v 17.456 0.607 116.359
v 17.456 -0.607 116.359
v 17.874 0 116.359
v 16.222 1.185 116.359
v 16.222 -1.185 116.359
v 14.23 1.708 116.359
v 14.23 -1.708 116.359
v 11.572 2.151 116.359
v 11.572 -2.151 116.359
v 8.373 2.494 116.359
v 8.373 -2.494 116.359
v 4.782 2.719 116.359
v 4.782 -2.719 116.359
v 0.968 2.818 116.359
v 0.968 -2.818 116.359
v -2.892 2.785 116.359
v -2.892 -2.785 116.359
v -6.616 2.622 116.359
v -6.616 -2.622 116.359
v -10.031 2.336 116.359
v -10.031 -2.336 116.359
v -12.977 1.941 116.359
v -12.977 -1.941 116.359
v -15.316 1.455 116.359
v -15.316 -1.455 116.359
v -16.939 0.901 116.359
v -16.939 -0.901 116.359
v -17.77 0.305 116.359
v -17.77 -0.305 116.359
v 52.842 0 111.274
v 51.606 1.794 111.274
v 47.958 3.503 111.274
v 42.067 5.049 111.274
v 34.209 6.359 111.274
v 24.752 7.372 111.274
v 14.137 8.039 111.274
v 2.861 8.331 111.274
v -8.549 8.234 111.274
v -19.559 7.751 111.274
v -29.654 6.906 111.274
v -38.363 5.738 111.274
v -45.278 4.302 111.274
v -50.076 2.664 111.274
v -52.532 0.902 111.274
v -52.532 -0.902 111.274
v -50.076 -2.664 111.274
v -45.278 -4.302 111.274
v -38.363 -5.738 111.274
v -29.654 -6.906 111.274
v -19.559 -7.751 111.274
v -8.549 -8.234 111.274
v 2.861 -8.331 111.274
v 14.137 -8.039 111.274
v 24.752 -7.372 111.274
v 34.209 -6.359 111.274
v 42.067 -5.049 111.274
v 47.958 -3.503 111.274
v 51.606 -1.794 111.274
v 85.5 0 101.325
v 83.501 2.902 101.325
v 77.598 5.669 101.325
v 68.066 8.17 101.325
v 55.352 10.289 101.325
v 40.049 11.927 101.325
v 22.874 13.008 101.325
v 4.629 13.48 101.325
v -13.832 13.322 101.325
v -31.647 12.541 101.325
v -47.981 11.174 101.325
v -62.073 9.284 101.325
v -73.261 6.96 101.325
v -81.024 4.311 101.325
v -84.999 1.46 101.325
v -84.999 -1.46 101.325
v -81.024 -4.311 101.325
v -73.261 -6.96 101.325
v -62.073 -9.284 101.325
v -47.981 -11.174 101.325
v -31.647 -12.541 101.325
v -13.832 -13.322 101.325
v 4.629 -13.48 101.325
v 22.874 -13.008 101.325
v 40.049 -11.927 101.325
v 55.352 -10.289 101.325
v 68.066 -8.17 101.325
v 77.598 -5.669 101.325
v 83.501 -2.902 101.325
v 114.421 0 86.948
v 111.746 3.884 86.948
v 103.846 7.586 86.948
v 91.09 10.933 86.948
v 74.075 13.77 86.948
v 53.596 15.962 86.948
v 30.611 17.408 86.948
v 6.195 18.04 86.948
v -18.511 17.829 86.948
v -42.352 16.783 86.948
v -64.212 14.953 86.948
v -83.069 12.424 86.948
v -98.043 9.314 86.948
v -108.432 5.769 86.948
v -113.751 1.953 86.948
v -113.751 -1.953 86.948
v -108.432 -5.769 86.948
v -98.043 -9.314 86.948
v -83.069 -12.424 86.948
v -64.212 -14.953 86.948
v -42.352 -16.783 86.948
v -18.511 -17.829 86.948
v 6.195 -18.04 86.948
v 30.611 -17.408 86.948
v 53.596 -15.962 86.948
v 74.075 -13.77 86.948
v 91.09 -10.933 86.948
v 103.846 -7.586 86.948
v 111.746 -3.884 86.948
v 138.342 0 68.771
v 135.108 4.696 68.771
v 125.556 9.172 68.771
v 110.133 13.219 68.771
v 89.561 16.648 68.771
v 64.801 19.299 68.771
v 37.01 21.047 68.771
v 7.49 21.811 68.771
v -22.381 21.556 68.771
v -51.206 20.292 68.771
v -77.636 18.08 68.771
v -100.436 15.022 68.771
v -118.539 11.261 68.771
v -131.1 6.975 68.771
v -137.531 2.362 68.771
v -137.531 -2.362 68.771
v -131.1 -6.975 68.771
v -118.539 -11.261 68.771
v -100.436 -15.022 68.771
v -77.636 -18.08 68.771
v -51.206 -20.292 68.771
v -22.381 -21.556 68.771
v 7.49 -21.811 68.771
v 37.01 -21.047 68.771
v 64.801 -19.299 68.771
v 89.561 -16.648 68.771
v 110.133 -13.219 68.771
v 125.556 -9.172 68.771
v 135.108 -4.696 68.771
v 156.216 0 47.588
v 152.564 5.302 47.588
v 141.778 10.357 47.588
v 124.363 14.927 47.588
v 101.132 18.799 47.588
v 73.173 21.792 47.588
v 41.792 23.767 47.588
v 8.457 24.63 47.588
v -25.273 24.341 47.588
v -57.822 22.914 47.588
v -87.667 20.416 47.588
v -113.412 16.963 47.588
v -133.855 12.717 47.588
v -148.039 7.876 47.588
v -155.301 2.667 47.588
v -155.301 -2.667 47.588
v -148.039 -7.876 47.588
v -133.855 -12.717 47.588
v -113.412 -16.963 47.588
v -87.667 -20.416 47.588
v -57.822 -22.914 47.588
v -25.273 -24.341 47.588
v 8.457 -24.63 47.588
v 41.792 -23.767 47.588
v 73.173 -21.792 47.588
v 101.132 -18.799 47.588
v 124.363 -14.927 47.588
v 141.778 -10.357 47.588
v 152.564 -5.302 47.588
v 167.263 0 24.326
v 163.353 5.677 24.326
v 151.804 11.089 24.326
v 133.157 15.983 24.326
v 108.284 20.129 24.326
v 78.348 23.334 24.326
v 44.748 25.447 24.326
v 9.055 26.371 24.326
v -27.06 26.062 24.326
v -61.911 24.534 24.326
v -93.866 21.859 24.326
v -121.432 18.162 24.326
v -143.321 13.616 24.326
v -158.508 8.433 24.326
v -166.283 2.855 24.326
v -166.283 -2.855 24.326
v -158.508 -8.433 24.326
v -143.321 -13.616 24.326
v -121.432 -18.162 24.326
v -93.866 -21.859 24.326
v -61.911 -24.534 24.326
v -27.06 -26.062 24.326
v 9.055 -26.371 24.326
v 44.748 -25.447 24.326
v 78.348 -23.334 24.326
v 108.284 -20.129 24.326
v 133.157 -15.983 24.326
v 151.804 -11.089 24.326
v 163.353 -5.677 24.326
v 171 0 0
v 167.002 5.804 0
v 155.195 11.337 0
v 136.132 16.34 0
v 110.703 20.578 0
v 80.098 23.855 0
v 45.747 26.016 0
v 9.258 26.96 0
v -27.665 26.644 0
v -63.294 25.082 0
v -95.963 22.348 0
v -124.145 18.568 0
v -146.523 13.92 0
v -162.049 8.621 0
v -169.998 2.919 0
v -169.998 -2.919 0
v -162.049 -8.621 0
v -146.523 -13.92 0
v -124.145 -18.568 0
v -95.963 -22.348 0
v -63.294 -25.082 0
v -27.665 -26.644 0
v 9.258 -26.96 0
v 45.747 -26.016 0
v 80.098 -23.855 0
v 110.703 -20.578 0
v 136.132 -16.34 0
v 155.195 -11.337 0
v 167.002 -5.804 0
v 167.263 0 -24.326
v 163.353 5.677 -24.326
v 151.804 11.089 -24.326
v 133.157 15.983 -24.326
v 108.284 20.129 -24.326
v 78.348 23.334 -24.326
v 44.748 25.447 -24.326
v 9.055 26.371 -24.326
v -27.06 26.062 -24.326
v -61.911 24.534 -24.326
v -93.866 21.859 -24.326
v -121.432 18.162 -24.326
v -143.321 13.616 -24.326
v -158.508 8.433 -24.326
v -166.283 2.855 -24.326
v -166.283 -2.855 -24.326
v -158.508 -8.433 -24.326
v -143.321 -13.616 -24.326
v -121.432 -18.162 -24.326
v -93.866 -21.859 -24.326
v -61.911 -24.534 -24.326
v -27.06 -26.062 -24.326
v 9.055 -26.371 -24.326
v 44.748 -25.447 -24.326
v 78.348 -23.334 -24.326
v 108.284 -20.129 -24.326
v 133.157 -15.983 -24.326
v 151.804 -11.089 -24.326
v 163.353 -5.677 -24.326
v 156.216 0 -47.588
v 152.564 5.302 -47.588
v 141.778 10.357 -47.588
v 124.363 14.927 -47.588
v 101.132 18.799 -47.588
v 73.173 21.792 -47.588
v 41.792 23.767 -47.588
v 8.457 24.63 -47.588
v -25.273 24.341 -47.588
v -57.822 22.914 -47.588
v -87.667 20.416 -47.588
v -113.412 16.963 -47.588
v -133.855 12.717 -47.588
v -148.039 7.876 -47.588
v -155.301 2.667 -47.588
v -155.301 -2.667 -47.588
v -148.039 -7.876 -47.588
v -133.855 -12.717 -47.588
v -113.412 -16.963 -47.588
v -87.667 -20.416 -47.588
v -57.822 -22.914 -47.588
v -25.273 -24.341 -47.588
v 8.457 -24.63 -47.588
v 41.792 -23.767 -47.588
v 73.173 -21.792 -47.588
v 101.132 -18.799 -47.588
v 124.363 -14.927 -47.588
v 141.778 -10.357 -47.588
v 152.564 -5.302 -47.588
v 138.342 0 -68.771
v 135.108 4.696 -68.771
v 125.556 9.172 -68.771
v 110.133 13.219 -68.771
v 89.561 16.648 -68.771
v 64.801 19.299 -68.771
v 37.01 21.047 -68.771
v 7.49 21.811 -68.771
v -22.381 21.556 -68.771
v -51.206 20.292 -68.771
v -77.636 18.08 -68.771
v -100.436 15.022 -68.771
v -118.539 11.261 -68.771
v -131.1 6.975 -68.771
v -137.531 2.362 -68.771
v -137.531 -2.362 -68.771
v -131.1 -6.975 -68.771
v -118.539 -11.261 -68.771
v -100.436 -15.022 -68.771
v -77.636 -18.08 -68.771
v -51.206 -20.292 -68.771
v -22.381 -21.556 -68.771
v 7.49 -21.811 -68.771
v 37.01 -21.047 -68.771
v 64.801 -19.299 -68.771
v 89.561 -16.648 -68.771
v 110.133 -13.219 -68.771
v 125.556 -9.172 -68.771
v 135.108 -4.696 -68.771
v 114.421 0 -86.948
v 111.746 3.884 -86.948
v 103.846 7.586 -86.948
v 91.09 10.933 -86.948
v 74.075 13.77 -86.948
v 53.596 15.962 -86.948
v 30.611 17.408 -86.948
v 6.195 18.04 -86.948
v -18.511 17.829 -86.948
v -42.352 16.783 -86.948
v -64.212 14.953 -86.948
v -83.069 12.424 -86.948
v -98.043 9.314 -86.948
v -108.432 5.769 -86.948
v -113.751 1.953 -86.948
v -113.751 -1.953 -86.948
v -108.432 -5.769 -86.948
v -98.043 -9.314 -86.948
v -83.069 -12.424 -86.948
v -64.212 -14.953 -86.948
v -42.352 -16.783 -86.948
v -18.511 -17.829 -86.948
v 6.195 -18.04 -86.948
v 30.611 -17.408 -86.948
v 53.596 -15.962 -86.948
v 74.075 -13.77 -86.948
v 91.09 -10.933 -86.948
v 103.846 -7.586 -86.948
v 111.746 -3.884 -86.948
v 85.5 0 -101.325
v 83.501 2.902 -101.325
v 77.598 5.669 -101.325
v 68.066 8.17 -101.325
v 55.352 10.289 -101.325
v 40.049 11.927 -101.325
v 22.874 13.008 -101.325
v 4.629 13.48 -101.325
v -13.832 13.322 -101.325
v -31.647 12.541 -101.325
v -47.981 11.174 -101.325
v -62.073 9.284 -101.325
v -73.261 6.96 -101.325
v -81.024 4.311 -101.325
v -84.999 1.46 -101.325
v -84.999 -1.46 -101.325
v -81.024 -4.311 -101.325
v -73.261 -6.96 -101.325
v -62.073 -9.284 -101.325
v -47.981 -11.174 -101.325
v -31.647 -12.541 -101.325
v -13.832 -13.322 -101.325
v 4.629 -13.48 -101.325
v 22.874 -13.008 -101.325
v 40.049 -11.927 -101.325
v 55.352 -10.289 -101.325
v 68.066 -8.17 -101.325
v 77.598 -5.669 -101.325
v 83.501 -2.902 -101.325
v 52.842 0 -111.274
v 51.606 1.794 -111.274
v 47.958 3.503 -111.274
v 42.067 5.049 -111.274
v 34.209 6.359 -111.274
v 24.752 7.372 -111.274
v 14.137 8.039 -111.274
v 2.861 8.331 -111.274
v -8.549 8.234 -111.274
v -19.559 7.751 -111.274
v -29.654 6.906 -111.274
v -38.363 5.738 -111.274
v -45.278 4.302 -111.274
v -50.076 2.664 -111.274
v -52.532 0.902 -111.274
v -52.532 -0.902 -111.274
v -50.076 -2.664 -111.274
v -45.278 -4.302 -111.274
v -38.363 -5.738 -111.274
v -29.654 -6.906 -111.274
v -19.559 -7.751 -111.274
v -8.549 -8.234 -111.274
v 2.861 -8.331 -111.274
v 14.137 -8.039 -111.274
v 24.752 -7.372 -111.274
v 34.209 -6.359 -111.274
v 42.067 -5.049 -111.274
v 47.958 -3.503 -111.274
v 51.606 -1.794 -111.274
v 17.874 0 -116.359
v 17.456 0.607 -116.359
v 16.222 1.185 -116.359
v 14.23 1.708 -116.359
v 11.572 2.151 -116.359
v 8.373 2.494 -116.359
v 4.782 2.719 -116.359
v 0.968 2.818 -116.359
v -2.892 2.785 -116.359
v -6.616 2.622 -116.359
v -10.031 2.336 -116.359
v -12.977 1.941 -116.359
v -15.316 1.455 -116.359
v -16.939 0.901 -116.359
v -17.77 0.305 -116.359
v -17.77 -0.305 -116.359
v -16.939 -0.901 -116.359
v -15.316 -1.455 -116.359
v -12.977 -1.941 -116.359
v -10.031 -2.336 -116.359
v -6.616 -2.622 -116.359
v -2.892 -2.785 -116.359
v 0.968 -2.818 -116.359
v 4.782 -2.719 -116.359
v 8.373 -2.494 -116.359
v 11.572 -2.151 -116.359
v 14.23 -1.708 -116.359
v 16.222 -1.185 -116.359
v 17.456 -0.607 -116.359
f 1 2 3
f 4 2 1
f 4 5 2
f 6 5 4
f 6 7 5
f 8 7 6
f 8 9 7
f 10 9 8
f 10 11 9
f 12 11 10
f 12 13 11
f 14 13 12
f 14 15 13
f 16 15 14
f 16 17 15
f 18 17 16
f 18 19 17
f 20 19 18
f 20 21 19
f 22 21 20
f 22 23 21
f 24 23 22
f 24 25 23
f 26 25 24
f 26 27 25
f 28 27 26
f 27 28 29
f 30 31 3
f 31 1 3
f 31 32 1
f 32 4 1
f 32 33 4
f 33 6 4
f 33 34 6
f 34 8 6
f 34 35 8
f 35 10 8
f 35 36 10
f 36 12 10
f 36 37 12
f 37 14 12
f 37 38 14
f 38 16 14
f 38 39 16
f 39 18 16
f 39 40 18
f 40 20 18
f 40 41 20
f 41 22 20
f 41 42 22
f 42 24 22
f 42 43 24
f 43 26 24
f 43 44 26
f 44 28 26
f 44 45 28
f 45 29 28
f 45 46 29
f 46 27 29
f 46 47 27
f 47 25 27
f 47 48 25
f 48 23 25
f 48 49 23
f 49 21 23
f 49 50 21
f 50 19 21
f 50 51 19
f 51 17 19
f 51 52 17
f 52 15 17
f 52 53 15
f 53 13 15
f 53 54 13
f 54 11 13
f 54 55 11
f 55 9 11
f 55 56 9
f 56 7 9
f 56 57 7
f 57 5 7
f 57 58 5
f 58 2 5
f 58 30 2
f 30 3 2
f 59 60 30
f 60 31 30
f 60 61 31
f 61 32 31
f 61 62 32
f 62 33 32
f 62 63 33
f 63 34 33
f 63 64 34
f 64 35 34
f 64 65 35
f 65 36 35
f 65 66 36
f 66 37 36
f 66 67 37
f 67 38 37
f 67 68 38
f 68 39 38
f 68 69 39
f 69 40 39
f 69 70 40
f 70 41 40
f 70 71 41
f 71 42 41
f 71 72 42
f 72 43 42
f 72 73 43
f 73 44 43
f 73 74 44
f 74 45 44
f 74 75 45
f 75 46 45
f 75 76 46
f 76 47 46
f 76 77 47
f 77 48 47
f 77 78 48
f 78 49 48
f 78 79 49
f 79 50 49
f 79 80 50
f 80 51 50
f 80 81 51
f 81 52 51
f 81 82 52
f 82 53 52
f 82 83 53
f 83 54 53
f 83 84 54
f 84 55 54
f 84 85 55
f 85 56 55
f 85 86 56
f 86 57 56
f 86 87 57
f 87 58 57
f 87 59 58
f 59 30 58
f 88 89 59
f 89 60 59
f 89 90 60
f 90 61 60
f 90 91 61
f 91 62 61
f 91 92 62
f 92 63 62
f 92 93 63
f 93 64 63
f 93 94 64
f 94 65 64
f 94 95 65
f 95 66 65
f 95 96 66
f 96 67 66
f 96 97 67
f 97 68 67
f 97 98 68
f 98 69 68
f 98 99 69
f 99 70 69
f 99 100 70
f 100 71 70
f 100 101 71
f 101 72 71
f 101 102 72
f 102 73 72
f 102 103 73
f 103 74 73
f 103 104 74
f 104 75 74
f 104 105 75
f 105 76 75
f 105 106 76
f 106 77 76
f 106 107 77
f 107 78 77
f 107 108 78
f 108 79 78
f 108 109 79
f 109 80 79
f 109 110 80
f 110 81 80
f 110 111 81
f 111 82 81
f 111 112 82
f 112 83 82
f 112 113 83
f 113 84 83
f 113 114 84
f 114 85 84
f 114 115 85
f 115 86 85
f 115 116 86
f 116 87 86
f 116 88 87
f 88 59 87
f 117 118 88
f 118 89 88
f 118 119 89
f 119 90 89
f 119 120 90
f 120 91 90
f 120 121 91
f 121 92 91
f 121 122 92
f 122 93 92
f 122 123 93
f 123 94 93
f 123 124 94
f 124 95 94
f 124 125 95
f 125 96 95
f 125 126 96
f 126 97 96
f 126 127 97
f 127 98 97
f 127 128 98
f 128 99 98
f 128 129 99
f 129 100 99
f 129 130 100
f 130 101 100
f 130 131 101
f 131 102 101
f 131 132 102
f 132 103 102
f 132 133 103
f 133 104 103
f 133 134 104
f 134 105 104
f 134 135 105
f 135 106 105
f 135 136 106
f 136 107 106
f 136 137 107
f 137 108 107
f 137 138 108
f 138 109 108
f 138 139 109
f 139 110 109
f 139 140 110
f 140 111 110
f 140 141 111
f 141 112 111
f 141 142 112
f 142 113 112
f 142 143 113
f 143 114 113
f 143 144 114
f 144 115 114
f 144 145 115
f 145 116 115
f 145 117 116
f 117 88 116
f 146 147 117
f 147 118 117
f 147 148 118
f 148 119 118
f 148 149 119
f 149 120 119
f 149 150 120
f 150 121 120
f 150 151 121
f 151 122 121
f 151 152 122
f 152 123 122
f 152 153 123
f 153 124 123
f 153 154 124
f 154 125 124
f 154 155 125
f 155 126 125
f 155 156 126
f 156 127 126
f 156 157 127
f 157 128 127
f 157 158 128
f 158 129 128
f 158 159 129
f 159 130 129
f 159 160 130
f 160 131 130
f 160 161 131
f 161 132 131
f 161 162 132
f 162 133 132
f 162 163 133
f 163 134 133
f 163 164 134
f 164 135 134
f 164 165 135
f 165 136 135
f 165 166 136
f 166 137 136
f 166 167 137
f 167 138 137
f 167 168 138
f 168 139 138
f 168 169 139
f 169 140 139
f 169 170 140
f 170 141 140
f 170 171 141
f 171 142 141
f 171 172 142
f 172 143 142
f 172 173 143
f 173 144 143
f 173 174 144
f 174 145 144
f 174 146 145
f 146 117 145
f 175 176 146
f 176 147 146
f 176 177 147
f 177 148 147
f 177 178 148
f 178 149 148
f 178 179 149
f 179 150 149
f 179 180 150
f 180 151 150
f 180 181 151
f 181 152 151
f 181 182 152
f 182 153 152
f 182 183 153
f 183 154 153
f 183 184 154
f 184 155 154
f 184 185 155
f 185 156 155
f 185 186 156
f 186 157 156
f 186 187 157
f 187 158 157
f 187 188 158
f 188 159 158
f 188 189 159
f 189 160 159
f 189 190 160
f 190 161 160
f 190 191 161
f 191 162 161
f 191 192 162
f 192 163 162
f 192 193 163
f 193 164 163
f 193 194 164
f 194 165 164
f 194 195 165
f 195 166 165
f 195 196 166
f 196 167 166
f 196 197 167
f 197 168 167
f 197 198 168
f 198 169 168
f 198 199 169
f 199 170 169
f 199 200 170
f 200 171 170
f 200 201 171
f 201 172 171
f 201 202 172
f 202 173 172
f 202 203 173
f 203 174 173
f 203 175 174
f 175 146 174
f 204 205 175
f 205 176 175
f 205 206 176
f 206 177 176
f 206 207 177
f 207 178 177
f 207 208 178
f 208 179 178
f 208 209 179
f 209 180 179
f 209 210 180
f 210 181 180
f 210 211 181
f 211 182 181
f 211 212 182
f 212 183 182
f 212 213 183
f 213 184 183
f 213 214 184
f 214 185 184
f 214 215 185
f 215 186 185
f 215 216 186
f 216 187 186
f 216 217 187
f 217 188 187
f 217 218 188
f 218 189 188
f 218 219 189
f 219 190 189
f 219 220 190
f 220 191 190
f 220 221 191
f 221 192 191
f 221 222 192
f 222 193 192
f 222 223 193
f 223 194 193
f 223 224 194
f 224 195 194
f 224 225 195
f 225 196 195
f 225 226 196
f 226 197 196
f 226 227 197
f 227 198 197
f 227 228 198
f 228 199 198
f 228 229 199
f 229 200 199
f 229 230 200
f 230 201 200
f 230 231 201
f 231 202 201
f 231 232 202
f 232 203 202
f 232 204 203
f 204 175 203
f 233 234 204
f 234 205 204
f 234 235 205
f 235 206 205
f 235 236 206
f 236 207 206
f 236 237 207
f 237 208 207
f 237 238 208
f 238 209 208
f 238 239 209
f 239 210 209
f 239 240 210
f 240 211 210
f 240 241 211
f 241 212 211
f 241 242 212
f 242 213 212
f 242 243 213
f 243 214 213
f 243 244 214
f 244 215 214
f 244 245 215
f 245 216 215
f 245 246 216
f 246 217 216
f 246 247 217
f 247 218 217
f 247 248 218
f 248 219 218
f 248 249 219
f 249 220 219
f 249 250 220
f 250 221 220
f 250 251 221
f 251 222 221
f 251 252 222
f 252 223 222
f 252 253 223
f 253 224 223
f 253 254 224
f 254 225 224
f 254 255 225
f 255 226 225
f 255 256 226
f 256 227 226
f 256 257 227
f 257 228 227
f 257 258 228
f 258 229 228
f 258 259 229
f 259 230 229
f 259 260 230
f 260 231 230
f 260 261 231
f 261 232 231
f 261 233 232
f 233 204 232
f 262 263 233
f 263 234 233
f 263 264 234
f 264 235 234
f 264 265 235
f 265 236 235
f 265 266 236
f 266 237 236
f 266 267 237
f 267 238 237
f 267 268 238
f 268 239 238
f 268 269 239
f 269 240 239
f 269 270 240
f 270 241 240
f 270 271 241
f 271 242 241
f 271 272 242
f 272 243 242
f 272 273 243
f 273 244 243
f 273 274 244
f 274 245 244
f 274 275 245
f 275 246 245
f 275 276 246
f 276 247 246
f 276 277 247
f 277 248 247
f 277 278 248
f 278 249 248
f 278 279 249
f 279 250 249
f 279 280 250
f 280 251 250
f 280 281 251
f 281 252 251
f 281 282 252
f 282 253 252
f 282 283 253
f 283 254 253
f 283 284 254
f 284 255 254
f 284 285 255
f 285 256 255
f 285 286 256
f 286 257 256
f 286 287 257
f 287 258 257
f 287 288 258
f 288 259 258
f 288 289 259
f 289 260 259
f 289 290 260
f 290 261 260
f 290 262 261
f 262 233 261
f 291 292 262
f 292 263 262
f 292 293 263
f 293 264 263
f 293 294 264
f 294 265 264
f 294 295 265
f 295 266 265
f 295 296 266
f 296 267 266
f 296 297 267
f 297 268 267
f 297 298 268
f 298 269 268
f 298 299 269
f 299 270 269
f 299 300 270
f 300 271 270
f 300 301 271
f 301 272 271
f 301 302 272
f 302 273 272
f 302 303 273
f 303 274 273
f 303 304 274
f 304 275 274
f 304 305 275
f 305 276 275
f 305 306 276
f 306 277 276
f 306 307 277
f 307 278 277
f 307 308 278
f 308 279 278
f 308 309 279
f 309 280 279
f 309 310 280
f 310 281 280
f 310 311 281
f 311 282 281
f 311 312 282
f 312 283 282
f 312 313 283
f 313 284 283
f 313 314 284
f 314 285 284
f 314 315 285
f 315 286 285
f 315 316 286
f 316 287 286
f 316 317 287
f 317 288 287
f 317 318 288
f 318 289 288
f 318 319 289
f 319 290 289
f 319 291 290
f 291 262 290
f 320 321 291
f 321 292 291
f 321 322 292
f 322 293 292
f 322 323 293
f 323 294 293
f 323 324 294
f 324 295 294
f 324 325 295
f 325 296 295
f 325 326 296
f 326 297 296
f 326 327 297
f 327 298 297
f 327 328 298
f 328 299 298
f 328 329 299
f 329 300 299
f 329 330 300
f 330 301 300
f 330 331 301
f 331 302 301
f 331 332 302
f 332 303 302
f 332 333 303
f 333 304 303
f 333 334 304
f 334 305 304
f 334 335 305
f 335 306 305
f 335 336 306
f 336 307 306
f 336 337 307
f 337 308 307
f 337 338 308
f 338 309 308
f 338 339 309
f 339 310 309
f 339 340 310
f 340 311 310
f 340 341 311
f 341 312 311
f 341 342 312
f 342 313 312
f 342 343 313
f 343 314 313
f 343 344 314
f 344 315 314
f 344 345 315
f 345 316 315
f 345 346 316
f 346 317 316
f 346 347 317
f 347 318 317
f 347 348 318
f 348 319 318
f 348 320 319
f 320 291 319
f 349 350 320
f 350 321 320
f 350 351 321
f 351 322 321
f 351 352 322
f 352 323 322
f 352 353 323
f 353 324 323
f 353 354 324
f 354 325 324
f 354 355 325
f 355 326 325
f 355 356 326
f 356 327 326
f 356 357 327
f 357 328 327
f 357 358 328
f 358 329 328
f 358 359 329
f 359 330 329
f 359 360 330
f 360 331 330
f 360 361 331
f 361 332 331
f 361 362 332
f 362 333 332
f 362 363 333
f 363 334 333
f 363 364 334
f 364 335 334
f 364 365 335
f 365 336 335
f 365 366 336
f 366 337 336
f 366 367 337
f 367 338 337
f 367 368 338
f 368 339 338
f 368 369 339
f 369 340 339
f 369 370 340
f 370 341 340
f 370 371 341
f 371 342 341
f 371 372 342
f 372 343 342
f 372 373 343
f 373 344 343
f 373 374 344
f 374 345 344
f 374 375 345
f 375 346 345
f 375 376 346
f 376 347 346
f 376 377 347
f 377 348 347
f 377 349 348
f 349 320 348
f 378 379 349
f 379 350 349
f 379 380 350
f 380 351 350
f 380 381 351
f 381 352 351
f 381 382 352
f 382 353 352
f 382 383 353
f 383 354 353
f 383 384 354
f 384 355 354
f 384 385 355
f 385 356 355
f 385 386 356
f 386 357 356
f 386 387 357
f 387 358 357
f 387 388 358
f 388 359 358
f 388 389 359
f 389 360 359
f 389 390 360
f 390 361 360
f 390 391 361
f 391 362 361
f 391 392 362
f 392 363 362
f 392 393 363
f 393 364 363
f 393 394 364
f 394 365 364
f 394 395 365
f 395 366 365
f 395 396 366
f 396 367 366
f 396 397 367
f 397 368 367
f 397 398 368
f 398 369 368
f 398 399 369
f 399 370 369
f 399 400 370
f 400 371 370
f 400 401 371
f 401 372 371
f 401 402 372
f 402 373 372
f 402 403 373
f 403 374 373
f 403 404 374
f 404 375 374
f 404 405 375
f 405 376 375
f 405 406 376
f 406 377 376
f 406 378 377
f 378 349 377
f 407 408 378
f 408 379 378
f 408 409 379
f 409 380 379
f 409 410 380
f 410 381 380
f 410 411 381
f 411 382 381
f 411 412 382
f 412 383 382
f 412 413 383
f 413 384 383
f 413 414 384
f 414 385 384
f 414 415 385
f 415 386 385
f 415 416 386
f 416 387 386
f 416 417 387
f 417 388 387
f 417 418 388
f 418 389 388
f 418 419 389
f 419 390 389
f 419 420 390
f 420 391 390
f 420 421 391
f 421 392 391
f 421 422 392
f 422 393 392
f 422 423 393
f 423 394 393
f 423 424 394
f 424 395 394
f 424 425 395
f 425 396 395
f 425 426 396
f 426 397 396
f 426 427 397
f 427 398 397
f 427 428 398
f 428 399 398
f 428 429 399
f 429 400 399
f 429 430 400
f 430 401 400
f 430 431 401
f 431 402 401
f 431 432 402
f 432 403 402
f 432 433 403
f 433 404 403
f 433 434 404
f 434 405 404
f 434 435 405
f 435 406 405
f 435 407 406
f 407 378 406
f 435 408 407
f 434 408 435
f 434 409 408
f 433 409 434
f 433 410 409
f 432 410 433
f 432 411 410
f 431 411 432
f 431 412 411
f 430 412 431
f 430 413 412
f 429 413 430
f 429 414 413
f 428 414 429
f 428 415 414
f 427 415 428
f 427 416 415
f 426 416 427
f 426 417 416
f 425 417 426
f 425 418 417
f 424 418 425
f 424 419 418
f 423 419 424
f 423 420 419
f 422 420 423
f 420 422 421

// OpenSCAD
// Generated by SolidPython 1.0.1 on 2020-07-29 00:46:53


scale(v = [19, 3, 13]) {
	sphere(r = 9);
}
/***********************************************
*********      SolidPython code:      **********
************************************************
 
# import packages: SolidPython
from solid import *
from solid.utils import *
from itertools import chain, combinations, permutations


class Resize:

    def __init__(self, scad_file):
        self.scad_file = scad_file
        #self.scad_file = import_scad(scad_file)
        # cone/cylinder param:
        self.r1 = 0
        self.r2 = 0
        self.h = 0
        # rectangular prism param:
        self.w = 0
        self.l = 0
        # ellipse param:
        self.r = 0

    # import OpenScad code (file name corresponds to shape)


    # classify shape + parameters
    def assign(self, param1, param2, param3):
        if self.scad_file == 'cone.scad':
            self.r1 = param1
            self.r2 = param2
            self.h = param3
        elif self.scad_file == 'cylinder.scad':
            self.r1 = param1
            self.r2 = param2
            self.h = param3
        elif self.scad_file == 'rectangularPrism.scad':
            self.h = param1
            self.l = param2
            self.w = param3
        else:
            self.r = param1
            self.h = param2

    # resize parameters
    def iterate(self):
        x = range(3, 20, 2)
        i = 1
        if self.scad_file == 'cone.scad':
            tempList = list(permutations(x, 2))
            for temp in tempList:
                param1 = temp[0]
                param2 = temp[1]
                filepath = 'produced_scad_files/' + 'cone' + str(param1) + '_' + str(param2) + '_' + '.scad'
                scad_render_to_file(cylinder(h=param1, r1=param2, r2=0), filepath)

        elif self.scad_file == 'cylinder.scad':
            tempList = list(permutations(x, 3))
            for temp in tempList:
                param1 = temp[0]
                param2 = temp[1]
                filepath = 'produced_scad_files/' + 'cylinder' + str(param1) + '_' + str(param2) + '_' + '.scad'
                scad_render_to_file(cylinder(h=param1, r1=param2, r2=param2), filepath)

        elif self.scad_file == 'rectangularPrism.scad':
            tempList = list(permutations(x, 3))
            for temp in tempList:
                param1 = temp[0]
                param2 = temp[1]
                param3 = temp[2]
                filepath = 'produced_scad_files/' + 'rectangularPrism' + str(param1) + '_' + str(param2) + '_' + str(
                    param3) + '.scad'
                scad_render_to_file(cube(size=(param1, param2, param3)), filepath)

        elif self.scad_file == 'ellipse.scad':
            tempList = list(permutations(x, 4))
            for temp in tempList:
                param1 = temp[0]
                param2 = temp[1]
                param3 = temp[2]
                param4 = temp[3]
                filepath = 'produced_scad_files/' + 'ellipse' + str(param1) + '_' + str(param2) + '_' + str(param3) + '_' + str(param4) + '.scad'
                scad_render_to_file(scale([param1, param2, param3])(sphere(r=param4)), filepath)

    def render_to_scadfile(self):
        scad_render_to_file(scad, 'example.scad') 
 
************************************************/
